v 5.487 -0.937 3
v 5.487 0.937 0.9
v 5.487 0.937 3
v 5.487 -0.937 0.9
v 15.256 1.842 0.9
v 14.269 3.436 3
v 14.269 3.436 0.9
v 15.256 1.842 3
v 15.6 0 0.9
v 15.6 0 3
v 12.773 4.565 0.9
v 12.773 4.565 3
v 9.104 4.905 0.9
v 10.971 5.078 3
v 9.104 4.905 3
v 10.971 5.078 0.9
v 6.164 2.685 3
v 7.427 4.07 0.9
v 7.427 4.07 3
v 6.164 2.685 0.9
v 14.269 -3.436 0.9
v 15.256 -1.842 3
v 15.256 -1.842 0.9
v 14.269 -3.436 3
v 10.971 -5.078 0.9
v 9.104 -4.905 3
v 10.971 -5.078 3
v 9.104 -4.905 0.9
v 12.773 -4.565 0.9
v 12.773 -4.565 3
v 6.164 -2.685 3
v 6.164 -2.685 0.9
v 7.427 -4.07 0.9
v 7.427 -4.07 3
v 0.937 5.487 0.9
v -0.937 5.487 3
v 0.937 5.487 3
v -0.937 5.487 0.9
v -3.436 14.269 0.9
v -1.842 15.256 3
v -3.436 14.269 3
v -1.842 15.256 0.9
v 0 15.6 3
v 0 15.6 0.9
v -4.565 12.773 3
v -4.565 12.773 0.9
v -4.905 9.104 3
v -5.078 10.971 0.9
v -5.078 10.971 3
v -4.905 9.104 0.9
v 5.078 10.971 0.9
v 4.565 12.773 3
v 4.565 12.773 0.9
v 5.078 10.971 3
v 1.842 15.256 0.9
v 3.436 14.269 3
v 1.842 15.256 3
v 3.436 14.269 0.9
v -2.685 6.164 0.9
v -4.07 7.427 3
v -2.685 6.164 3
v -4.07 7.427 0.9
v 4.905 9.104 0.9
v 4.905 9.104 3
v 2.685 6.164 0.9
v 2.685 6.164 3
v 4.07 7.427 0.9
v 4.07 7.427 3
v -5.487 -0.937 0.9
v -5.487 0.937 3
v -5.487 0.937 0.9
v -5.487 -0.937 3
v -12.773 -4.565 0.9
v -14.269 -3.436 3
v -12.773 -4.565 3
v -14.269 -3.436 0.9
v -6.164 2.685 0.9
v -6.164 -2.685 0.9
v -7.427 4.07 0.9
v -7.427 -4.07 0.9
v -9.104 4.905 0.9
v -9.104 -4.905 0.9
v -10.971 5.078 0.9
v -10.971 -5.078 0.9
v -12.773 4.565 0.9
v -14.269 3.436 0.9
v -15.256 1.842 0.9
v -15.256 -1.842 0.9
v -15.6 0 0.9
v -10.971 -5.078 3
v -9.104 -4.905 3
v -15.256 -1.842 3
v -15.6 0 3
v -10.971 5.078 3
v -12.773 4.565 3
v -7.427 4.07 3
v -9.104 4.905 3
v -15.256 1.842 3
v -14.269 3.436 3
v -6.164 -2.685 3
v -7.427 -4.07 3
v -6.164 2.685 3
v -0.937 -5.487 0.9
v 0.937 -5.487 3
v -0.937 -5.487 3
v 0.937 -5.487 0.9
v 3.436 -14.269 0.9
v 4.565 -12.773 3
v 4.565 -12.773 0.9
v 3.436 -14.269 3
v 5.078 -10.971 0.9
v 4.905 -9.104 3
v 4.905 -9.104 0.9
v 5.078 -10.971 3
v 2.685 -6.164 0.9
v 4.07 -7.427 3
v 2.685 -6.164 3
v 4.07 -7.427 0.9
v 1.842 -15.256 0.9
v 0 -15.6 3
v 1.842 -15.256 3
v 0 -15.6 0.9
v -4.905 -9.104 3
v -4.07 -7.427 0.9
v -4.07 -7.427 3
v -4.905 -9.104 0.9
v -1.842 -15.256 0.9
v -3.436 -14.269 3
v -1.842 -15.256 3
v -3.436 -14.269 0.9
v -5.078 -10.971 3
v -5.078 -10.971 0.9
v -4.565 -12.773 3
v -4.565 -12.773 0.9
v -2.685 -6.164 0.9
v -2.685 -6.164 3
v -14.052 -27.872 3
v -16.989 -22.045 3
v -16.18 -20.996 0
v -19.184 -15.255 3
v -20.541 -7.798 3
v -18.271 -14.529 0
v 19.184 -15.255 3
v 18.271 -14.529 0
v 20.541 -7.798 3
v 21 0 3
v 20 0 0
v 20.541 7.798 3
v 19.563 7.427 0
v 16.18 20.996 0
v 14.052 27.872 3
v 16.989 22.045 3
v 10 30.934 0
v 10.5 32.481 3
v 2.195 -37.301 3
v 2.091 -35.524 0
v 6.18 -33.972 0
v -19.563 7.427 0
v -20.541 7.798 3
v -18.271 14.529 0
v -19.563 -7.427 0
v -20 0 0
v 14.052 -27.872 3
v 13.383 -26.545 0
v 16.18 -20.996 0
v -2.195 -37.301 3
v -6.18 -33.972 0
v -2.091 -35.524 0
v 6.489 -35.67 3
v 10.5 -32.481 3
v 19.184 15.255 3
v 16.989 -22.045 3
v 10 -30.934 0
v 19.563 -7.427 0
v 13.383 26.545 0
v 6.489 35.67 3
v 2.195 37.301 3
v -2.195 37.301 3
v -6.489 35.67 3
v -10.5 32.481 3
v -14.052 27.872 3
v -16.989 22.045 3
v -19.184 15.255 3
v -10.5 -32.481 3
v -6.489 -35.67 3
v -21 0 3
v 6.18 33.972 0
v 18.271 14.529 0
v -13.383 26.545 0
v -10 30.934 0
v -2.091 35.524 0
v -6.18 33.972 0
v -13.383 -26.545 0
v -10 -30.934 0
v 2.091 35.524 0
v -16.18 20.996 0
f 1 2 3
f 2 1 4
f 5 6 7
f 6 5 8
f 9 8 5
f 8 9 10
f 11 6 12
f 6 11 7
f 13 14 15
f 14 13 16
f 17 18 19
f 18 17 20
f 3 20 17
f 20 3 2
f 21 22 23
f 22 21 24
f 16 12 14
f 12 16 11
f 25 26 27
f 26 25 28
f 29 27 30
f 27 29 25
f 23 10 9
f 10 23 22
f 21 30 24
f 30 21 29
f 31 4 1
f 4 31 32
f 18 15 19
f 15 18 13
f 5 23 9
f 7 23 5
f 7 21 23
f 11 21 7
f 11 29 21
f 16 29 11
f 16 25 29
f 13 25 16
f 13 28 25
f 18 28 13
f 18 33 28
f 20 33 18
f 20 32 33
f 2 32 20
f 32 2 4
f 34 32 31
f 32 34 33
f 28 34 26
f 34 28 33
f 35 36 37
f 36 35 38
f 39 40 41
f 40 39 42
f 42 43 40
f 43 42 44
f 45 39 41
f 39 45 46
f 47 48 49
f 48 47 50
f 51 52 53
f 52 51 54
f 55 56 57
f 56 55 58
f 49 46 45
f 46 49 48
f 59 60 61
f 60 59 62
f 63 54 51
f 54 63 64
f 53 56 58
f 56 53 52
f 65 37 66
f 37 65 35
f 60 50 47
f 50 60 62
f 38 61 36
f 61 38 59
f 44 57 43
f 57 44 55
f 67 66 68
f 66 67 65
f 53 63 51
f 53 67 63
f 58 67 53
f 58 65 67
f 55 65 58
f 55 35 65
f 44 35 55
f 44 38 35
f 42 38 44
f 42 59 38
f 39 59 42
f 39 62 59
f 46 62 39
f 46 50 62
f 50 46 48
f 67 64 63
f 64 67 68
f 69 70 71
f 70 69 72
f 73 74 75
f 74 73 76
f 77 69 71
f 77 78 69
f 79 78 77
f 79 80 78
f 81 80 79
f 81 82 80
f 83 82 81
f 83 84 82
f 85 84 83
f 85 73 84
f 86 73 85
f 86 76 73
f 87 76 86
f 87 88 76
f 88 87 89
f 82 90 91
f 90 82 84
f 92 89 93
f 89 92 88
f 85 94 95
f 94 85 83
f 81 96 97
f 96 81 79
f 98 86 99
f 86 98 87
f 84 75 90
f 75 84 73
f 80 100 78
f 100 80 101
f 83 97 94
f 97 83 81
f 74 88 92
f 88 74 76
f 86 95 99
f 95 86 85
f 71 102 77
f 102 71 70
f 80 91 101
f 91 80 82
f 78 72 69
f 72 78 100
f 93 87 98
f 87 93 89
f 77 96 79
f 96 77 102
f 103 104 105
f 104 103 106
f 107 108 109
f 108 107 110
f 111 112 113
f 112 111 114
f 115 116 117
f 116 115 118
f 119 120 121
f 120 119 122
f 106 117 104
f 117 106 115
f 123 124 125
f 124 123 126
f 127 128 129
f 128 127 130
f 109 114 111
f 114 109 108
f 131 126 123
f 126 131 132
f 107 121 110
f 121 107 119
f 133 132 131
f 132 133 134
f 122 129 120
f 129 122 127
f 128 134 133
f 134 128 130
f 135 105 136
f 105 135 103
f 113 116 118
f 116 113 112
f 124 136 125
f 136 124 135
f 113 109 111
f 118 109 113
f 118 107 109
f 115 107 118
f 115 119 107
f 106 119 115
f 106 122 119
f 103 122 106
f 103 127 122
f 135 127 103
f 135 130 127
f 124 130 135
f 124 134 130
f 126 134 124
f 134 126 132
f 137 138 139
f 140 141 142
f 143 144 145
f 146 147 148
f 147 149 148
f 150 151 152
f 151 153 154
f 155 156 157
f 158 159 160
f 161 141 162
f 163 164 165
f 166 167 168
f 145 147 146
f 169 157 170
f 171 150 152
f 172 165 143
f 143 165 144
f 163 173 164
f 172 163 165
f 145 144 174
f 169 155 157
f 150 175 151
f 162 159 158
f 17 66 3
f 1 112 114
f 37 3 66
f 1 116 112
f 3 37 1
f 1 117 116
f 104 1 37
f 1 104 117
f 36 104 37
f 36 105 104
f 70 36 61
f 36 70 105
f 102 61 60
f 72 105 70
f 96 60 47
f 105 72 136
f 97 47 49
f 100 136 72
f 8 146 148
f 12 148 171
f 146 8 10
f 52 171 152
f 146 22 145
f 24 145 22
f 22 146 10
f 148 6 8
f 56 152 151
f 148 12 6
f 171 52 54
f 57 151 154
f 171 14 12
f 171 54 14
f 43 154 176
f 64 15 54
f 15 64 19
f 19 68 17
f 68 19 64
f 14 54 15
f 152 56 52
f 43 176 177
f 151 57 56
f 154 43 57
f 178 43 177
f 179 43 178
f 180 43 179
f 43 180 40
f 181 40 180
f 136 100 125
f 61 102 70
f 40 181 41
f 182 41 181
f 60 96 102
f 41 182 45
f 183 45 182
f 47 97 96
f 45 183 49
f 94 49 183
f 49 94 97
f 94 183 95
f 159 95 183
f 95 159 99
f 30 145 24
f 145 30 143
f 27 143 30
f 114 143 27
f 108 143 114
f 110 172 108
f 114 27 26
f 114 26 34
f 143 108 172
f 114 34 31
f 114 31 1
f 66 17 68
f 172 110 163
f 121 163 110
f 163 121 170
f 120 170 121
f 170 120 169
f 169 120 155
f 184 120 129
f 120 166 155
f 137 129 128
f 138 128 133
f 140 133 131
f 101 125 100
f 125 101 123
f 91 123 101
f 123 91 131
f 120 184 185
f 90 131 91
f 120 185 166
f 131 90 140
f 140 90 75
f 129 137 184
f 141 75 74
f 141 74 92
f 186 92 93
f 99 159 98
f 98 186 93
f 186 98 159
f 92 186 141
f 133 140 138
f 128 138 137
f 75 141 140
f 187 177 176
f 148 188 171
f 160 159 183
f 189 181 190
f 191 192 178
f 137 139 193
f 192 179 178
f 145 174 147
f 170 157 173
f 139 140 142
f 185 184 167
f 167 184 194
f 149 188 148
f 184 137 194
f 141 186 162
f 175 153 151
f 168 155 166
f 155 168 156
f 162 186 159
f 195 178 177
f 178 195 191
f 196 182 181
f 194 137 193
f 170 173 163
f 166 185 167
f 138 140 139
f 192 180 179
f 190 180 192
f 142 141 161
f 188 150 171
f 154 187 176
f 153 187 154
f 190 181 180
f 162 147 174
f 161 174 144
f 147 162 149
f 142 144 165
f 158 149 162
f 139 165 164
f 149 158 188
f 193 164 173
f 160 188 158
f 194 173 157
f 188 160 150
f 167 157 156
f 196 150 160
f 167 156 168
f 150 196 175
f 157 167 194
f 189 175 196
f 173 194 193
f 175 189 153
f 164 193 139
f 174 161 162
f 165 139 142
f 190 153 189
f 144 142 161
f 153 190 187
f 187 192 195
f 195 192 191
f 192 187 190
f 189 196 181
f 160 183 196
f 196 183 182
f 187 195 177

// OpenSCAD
outer_radius = 21; //12.5 is standard
magnet_radius = 5.1;
base_height = 3;
magnet_height = 2.1;
slot = 0;
oval = 1;

difference(){
    if (oval == 1){
        scale([1.0,1.786,1.0]) cylinder(h = base_height, r1 = outer_radius-1, r2 = outer_radius, center = false);
    } else {
        cylinder(h = base_height, r1 = outer_radius-1, r2 = outer_radius, center = false);
    }
    
    if (slot == 1) {
        translate([-outer_radius+1.5,0,-magnet_height]){
            cube([outer_radius*2-3,2,2*base_height], false);
                }
    }
    if (outer_radius > 20){
        for (i = [0:3]) {
            rotate([0,0,90*i]){
                translate([outer_radius/2,0,base_height-magnet_height]){
                    color([0,0,1]) cylinder(h=magnet_height*2, r=magnet_radius);
                }
            }
        }
    } else {
        translate([0,0,base_height-magnet_height]){
            color([0,0,1]) cylinder(h = magnet_height*2, r1 = magnet_radius, r2 = magnet_radius, center = false);
        }        
    }
}
